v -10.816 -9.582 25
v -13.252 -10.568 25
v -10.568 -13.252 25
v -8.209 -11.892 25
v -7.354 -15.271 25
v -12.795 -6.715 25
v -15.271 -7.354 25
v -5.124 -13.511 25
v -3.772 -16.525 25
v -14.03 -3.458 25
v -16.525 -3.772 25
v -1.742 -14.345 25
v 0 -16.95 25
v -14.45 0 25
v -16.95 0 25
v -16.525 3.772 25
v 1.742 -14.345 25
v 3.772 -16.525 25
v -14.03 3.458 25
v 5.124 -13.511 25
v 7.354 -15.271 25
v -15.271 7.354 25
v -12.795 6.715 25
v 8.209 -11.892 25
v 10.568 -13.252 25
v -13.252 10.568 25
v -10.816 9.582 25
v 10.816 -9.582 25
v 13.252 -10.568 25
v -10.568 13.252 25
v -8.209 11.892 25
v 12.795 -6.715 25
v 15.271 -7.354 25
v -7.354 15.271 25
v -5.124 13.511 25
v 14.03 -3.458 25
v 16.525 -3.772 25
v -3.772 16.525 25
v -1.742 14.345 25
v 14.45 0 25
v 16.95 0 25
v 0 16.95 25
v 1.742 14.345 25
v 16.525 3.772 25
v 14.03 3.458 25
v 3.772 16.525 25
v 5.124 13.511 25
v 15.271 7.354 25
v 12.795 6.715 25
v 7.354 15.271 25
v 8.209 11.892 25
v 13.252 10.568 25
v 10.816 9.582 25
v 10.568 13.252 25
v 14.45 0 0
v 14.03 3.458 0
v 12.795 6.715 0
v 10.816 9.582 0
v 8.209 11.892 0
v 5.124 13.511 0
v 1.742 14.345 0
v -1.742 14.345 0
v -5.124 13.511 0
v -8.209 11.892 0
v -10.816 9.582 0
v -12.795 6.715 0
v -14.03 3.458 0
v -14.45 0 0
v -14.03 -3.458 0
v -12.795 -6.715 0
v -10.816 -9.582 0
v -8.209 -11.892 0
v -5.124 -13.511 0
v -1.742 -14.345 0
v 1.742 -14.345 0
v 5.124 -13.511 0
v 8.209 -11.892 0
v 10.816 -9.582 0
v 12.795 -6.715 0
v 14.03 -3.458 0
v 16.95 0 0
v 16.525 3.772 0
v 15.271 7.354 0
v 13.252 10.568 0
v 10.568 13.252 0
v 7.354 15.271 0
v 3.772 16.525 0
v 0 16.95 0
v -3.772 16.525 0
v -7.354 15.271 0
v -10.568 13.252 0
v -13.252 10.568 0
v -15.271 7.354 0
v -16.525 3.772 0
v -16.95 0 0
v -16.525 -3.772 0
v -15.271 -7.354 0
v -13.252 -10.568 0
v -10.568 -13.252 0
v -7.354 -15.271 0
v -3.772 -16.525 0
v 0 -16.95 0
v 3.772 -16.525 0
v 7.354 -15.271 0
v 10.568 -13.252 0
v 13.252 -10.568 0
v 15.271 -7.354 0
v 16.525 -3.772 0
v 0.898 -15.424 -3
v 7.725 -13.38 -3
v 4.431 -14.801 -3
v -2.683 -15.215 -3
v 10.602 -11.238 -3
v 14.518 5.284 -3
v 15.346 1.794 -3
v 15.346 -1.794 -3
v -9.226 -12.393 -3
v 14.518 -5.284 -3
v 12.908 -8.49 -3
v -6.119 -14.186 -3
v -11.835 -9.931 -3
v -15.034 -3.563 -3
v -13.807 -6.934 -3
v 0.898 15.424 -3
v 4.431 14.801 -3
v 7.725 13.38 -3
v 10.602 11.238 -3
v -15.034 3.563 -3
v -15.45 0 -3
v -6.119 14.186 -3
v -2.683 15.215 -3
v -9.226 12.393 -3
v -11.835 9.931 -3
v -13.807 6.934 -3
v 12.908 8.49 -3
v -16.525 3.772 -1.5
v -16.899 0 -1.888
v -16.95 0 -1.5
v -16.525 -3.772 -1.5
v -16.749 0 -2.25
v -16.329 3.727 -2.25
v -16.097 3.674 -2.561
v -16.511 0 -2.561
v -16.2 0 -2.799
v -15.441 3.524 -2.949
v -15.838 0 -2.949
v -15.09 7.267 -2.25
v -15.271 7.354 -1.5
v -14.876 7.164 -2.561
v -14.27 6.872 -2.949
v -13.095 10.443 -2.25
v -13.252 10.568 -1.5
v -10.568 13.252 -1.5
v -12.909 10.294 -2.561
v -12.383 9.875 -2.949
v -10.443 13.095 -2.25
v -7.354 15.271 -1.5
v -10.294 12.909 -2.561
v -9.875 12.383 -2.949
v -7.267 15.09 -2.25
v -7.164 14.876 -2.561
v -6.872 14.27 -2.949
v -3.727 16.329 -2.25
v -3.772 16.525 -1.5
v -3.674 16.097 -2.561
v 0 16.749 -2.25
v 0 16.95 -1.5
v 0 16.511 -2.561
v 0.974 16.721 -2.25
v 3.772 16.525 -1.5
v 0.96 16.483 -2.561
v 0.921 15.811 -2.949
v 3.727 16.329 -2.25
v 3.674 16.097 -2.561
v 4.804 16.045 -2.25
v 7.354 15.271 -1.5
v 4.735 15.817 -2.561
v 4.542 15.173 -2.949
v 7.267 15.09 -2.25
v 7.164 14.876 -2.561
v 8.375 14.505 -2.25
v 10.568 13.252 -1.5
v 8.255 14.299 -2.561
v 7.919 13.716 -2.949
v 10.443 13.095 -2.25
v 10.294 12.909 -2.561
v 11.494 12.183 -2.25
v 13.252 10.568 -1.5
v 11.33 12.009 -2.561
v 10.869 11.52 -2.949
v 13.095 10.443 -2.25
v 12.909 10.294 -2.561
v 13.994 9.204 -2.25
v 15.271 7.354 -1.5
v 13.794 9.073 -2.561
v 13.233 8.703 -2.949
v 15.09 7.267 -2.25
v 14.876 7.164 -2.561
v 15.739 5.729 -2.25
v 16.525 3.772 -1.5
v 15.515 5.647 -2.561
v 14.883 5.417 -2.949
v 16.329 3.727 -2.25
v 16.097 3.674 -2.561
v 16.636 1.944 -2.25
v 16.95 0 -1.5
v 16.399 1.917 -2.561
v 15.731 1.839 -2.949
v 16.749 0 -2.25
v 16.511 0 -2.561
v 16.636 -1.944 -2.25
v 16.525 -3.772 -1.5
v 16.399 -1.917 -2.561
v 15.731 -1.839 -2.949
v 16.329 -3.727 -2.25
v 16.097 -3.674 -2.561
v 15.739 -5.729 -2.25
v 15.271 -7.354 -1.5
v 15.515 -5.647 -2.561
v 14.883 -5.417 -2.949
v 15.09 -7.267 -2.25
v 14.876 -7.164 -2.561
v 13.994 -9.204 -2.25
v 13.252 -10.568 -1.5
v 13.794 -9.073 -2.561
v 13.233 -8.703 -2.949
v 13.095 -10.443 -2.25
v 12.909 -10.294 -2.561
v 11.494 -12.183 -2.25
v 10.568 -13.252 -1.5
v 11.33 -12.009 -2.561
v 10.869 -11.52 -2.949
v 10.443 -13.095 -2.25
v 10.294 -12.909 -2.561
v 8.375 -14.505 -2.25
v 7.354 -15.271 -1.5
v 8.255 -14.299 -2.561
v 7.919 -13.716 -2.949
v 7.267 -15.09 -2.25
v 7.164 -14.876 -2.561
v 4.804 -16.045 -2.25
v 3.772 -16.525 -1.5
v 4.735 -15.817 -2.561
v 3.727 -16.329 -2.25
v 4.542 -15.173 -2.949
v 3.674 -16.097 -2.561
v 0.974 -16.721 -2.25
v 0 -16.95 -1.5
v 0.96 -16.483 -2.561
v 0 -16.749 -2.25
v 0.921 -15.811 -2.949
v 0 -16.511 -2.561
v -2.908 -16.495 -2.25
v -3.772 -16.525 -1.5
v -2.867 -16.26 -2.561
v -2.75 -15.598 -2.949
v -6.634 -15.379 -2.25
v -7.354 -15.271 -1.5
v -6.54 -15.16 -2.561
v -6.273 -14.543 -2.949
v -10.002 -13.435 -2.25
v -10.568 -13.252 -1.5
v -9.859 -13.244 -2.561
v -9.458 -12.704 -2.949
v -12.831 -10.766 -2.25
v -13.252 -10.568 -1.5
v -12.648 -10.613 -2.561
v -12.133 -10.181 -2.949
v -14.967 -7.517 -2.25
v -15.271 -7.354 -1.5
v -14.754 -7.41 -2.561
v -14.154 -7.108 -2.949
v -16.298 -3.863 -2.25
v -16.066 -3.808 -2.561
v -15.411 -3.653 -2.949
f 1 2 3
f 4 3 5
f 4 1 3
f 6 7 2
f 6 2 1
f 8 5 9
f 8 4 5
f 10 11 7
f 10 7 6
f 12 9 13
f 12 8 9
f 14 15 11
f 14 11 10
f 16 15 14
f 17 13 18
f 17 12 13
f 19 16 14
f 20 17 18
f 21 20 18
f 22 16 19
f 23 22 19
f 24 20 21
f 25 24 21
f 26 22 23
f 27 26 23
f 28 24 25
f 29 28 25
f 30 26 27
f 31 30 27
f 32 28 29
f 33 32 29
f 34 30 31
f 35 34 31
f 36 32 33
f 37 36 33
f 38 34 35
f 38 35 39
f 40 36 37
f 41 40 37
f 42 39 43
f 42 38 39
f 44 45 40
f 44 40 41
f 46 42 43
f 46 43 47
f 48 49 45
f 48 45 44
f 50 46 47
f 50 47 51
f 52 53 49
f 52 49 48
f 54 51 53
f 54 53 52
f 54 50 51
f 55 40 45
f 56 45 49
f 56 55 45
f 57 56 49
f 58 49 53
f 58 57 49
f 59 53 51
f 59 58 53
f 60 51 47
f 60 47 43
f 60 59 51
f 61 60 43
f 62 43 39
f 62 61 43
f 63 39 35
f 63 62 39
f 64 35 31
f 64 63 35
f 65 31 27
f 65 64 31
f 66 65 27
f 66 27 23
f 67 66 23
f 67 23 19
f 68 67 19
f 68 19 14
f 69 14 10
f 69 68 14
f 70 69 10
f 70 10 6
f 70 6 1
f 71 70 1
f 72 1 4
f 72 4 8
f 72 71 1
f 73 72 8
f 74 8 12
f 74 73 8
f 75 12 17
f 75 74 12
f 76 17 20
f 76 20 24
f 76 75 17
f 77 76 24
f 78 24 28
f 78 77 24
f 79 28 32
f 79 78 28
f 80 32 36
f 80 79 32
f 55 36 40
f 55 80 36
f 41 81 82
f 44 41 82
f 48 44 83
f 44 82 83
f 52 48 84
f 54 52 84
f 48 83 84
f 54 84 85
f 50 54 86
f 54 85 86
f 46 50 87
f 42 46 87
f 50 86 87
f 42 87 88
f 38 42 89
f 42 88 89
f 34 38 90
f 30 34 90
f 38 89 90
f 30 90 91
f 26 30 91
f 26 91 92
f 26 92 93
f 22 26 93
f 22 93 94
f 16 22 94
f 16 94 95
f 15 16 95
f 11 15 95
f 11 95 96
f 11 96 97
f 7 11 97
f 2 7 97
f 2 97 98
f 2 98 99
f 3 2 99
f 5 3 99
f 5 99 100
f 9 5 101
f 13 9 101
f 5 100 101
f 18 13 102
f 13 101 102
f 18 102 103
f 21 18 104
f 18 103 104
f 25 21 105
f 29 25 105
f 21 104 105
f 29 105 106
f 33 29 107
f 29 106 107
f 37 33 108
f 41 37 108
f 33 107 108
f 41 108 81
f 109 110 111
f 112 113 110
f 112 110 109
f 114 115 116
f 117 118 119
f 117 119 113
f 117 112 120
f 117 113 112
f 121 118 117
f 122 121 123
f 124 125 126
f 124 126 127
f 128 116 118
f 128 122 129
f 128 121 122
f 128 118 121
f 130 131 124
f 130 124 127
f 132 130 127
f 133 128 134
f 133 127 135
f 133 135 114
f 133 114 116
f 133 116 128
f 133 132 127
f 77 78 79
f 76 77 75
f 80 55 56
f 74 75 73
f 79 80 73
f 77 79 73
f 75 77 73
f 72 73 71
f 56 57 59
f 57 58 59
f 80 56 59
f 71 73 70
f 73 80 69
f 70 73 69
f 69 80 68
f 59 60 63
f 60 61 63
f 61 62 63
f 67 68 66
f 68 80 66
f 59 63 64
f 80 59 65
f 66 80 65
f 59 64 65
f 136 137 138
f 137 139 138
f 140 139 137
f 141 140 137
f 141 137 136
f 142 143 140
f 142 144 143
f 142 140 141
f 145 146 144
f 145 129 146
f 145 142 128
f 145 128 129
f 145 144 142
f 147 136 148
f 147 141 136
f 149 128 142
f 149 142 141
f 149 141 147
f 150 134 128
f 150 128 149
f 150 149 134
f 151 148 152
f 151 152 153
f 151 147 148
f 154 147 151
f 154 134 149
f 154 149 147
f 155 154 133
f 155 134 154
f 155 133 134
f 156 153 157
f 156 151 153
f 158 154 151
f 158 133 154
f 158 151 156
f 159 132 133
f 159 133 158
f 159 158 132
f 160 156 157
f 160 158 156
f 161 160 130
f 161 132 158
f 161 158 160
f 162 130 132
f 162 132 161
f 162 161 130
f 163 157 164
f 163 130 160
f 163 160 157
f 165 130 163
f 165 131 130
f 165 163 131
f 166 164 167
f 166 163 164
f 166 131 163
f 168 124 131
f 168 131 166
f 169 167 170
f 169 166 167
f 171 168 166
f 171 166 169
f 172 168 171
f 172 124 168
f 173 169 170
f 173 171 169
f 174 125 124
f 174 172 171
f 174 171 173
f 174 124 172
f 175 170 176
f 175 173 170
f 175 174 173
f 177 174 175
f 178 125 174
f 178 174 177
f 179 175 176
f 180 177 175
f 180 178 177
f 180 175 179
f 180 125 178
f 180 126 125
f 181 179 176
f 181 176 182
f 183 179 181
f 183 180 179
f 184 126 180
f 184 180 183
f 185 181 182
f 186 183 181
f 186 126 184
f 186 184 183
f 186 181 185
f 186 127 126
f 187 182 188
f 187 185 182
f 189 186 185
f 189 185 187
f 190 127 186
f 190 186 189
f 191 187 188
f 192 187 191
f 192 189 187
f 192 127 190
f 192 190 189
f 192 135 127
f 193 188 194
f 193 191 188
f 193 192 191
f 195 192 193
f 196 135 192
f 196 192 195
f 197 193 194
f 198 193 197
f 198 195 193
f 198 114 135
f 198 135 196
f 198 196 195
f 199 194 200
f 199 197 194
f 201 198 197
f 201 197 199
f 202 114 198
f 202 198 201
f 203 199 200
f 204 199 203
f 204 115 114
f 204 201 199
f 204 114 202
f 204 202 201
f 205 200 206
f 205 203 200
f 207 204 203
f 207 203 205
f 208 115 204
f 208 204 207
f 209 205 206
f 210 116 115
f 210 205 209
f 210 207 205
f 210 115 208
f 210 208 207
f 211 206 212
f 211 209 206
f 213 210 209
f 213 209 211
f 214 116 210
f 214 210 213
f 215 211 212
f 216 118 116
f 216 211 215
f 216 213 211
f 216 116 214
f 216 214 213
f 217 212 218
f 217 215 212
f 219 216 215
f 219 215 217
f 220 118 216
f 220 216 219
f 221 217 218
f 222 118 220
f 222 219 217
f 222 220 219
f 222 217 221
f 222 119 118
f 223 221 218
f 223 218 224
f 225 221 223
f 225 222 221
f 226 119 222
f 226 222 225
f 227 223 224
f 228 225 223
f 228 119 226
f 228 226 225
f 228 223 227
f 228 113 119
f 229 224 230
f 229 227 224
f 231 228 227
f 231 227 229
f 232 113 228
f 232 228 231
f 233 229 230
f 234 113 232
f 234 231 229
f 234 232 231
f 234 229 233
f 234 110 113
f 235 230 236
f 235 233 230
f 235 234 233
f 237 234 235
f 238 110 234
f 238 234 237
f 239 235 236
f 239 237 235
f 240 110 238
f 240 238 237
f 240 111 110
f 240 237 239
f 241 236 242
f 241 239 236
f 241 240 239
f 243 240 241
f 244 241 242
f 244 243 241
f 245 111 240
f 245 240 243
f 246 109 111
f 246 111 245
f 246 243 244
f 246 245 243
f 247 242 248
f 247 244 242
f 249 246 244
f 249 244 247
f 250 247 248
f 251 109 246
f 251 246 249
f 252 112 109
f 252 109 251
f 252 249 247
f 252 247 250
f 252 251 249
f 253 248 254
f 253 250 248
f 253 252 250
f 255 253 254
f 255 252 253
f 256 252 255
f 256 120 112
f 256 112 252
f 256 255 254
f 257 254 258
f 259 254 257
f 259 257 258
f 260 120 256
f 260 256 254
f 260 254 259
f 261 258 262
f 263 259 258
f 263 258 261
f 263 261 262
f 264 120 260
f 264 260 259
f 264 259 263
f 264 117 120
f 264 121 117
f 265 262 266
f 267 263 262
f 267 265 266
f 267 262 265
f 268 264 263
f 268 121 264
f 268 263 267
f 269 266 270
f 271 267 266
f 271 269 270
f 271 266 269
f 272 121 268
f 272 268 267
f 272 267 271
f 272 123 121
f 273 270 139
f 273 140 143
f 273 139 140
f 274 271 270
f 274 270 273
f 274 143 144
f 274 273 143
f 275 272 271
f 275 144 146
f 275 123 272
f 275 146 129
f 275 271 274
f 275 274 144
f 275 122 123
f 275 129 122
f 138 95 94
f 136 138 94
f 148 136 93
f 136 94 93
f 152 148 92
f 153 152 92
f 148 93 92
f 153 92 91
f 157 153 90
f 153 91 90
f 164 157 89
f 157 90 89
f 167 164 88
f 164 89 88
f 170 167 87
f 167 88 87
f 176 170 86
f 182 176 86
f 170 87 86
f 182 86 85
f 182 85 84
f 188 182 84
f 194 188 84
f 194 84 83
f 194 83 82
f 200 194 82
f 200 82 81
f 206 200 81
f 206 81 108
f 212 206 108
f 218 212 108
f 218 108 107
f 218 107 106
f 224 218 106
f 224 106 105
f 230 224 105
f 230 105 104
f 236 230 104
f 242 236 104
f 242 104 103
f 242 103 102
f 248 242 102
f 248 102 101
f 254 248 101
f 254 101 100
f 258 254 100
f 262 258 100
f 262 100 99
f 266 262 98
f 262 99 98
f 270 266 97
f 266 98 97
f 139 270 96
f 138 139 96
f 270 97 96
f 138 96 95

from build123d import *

# Parameters (mm, degrees)
SKETCH1_R           = 16.95
SKETCH1_R_2         = 14.45
BOSS_EXTRUDE1_DEPTH = 25
SKETCH2_R           = 16.95
BOSS_EXTRUDE2_DEPTH = 3
FILLET1_R           = 1.5


with BuildPart() as part:
    # Sketch1 → Boss-Extrude1 (new body)
    with BuildSketch(Plane.XY):
        Circle(SKETCH1_R)
        Circle(SKETCH1_R_2, mode=Mode.SUBTRACT)
    extrude(amount=BOSS_EXTRUDE1_DEPTH)

    # Sketch2 → Boss-Extrude2 (add)
    with BuildSketch(Plane(origin=(0, 0, 0), x_dir=(-1, 0, 0), z_dir=(0, 0, -1))):
        Circle(SKETCH2_R)
    extrude(amount=BOSS_EXTRUDE2_DEPTH)

    # Fillet1
    fillet1_edges = [part.edges().sort_by_distance(p)[0] for p in [
        (16.95, 0, -3),
    ]]
    fillet(fillet1_edges, radius=FILLET1_R)


solid = part.part
